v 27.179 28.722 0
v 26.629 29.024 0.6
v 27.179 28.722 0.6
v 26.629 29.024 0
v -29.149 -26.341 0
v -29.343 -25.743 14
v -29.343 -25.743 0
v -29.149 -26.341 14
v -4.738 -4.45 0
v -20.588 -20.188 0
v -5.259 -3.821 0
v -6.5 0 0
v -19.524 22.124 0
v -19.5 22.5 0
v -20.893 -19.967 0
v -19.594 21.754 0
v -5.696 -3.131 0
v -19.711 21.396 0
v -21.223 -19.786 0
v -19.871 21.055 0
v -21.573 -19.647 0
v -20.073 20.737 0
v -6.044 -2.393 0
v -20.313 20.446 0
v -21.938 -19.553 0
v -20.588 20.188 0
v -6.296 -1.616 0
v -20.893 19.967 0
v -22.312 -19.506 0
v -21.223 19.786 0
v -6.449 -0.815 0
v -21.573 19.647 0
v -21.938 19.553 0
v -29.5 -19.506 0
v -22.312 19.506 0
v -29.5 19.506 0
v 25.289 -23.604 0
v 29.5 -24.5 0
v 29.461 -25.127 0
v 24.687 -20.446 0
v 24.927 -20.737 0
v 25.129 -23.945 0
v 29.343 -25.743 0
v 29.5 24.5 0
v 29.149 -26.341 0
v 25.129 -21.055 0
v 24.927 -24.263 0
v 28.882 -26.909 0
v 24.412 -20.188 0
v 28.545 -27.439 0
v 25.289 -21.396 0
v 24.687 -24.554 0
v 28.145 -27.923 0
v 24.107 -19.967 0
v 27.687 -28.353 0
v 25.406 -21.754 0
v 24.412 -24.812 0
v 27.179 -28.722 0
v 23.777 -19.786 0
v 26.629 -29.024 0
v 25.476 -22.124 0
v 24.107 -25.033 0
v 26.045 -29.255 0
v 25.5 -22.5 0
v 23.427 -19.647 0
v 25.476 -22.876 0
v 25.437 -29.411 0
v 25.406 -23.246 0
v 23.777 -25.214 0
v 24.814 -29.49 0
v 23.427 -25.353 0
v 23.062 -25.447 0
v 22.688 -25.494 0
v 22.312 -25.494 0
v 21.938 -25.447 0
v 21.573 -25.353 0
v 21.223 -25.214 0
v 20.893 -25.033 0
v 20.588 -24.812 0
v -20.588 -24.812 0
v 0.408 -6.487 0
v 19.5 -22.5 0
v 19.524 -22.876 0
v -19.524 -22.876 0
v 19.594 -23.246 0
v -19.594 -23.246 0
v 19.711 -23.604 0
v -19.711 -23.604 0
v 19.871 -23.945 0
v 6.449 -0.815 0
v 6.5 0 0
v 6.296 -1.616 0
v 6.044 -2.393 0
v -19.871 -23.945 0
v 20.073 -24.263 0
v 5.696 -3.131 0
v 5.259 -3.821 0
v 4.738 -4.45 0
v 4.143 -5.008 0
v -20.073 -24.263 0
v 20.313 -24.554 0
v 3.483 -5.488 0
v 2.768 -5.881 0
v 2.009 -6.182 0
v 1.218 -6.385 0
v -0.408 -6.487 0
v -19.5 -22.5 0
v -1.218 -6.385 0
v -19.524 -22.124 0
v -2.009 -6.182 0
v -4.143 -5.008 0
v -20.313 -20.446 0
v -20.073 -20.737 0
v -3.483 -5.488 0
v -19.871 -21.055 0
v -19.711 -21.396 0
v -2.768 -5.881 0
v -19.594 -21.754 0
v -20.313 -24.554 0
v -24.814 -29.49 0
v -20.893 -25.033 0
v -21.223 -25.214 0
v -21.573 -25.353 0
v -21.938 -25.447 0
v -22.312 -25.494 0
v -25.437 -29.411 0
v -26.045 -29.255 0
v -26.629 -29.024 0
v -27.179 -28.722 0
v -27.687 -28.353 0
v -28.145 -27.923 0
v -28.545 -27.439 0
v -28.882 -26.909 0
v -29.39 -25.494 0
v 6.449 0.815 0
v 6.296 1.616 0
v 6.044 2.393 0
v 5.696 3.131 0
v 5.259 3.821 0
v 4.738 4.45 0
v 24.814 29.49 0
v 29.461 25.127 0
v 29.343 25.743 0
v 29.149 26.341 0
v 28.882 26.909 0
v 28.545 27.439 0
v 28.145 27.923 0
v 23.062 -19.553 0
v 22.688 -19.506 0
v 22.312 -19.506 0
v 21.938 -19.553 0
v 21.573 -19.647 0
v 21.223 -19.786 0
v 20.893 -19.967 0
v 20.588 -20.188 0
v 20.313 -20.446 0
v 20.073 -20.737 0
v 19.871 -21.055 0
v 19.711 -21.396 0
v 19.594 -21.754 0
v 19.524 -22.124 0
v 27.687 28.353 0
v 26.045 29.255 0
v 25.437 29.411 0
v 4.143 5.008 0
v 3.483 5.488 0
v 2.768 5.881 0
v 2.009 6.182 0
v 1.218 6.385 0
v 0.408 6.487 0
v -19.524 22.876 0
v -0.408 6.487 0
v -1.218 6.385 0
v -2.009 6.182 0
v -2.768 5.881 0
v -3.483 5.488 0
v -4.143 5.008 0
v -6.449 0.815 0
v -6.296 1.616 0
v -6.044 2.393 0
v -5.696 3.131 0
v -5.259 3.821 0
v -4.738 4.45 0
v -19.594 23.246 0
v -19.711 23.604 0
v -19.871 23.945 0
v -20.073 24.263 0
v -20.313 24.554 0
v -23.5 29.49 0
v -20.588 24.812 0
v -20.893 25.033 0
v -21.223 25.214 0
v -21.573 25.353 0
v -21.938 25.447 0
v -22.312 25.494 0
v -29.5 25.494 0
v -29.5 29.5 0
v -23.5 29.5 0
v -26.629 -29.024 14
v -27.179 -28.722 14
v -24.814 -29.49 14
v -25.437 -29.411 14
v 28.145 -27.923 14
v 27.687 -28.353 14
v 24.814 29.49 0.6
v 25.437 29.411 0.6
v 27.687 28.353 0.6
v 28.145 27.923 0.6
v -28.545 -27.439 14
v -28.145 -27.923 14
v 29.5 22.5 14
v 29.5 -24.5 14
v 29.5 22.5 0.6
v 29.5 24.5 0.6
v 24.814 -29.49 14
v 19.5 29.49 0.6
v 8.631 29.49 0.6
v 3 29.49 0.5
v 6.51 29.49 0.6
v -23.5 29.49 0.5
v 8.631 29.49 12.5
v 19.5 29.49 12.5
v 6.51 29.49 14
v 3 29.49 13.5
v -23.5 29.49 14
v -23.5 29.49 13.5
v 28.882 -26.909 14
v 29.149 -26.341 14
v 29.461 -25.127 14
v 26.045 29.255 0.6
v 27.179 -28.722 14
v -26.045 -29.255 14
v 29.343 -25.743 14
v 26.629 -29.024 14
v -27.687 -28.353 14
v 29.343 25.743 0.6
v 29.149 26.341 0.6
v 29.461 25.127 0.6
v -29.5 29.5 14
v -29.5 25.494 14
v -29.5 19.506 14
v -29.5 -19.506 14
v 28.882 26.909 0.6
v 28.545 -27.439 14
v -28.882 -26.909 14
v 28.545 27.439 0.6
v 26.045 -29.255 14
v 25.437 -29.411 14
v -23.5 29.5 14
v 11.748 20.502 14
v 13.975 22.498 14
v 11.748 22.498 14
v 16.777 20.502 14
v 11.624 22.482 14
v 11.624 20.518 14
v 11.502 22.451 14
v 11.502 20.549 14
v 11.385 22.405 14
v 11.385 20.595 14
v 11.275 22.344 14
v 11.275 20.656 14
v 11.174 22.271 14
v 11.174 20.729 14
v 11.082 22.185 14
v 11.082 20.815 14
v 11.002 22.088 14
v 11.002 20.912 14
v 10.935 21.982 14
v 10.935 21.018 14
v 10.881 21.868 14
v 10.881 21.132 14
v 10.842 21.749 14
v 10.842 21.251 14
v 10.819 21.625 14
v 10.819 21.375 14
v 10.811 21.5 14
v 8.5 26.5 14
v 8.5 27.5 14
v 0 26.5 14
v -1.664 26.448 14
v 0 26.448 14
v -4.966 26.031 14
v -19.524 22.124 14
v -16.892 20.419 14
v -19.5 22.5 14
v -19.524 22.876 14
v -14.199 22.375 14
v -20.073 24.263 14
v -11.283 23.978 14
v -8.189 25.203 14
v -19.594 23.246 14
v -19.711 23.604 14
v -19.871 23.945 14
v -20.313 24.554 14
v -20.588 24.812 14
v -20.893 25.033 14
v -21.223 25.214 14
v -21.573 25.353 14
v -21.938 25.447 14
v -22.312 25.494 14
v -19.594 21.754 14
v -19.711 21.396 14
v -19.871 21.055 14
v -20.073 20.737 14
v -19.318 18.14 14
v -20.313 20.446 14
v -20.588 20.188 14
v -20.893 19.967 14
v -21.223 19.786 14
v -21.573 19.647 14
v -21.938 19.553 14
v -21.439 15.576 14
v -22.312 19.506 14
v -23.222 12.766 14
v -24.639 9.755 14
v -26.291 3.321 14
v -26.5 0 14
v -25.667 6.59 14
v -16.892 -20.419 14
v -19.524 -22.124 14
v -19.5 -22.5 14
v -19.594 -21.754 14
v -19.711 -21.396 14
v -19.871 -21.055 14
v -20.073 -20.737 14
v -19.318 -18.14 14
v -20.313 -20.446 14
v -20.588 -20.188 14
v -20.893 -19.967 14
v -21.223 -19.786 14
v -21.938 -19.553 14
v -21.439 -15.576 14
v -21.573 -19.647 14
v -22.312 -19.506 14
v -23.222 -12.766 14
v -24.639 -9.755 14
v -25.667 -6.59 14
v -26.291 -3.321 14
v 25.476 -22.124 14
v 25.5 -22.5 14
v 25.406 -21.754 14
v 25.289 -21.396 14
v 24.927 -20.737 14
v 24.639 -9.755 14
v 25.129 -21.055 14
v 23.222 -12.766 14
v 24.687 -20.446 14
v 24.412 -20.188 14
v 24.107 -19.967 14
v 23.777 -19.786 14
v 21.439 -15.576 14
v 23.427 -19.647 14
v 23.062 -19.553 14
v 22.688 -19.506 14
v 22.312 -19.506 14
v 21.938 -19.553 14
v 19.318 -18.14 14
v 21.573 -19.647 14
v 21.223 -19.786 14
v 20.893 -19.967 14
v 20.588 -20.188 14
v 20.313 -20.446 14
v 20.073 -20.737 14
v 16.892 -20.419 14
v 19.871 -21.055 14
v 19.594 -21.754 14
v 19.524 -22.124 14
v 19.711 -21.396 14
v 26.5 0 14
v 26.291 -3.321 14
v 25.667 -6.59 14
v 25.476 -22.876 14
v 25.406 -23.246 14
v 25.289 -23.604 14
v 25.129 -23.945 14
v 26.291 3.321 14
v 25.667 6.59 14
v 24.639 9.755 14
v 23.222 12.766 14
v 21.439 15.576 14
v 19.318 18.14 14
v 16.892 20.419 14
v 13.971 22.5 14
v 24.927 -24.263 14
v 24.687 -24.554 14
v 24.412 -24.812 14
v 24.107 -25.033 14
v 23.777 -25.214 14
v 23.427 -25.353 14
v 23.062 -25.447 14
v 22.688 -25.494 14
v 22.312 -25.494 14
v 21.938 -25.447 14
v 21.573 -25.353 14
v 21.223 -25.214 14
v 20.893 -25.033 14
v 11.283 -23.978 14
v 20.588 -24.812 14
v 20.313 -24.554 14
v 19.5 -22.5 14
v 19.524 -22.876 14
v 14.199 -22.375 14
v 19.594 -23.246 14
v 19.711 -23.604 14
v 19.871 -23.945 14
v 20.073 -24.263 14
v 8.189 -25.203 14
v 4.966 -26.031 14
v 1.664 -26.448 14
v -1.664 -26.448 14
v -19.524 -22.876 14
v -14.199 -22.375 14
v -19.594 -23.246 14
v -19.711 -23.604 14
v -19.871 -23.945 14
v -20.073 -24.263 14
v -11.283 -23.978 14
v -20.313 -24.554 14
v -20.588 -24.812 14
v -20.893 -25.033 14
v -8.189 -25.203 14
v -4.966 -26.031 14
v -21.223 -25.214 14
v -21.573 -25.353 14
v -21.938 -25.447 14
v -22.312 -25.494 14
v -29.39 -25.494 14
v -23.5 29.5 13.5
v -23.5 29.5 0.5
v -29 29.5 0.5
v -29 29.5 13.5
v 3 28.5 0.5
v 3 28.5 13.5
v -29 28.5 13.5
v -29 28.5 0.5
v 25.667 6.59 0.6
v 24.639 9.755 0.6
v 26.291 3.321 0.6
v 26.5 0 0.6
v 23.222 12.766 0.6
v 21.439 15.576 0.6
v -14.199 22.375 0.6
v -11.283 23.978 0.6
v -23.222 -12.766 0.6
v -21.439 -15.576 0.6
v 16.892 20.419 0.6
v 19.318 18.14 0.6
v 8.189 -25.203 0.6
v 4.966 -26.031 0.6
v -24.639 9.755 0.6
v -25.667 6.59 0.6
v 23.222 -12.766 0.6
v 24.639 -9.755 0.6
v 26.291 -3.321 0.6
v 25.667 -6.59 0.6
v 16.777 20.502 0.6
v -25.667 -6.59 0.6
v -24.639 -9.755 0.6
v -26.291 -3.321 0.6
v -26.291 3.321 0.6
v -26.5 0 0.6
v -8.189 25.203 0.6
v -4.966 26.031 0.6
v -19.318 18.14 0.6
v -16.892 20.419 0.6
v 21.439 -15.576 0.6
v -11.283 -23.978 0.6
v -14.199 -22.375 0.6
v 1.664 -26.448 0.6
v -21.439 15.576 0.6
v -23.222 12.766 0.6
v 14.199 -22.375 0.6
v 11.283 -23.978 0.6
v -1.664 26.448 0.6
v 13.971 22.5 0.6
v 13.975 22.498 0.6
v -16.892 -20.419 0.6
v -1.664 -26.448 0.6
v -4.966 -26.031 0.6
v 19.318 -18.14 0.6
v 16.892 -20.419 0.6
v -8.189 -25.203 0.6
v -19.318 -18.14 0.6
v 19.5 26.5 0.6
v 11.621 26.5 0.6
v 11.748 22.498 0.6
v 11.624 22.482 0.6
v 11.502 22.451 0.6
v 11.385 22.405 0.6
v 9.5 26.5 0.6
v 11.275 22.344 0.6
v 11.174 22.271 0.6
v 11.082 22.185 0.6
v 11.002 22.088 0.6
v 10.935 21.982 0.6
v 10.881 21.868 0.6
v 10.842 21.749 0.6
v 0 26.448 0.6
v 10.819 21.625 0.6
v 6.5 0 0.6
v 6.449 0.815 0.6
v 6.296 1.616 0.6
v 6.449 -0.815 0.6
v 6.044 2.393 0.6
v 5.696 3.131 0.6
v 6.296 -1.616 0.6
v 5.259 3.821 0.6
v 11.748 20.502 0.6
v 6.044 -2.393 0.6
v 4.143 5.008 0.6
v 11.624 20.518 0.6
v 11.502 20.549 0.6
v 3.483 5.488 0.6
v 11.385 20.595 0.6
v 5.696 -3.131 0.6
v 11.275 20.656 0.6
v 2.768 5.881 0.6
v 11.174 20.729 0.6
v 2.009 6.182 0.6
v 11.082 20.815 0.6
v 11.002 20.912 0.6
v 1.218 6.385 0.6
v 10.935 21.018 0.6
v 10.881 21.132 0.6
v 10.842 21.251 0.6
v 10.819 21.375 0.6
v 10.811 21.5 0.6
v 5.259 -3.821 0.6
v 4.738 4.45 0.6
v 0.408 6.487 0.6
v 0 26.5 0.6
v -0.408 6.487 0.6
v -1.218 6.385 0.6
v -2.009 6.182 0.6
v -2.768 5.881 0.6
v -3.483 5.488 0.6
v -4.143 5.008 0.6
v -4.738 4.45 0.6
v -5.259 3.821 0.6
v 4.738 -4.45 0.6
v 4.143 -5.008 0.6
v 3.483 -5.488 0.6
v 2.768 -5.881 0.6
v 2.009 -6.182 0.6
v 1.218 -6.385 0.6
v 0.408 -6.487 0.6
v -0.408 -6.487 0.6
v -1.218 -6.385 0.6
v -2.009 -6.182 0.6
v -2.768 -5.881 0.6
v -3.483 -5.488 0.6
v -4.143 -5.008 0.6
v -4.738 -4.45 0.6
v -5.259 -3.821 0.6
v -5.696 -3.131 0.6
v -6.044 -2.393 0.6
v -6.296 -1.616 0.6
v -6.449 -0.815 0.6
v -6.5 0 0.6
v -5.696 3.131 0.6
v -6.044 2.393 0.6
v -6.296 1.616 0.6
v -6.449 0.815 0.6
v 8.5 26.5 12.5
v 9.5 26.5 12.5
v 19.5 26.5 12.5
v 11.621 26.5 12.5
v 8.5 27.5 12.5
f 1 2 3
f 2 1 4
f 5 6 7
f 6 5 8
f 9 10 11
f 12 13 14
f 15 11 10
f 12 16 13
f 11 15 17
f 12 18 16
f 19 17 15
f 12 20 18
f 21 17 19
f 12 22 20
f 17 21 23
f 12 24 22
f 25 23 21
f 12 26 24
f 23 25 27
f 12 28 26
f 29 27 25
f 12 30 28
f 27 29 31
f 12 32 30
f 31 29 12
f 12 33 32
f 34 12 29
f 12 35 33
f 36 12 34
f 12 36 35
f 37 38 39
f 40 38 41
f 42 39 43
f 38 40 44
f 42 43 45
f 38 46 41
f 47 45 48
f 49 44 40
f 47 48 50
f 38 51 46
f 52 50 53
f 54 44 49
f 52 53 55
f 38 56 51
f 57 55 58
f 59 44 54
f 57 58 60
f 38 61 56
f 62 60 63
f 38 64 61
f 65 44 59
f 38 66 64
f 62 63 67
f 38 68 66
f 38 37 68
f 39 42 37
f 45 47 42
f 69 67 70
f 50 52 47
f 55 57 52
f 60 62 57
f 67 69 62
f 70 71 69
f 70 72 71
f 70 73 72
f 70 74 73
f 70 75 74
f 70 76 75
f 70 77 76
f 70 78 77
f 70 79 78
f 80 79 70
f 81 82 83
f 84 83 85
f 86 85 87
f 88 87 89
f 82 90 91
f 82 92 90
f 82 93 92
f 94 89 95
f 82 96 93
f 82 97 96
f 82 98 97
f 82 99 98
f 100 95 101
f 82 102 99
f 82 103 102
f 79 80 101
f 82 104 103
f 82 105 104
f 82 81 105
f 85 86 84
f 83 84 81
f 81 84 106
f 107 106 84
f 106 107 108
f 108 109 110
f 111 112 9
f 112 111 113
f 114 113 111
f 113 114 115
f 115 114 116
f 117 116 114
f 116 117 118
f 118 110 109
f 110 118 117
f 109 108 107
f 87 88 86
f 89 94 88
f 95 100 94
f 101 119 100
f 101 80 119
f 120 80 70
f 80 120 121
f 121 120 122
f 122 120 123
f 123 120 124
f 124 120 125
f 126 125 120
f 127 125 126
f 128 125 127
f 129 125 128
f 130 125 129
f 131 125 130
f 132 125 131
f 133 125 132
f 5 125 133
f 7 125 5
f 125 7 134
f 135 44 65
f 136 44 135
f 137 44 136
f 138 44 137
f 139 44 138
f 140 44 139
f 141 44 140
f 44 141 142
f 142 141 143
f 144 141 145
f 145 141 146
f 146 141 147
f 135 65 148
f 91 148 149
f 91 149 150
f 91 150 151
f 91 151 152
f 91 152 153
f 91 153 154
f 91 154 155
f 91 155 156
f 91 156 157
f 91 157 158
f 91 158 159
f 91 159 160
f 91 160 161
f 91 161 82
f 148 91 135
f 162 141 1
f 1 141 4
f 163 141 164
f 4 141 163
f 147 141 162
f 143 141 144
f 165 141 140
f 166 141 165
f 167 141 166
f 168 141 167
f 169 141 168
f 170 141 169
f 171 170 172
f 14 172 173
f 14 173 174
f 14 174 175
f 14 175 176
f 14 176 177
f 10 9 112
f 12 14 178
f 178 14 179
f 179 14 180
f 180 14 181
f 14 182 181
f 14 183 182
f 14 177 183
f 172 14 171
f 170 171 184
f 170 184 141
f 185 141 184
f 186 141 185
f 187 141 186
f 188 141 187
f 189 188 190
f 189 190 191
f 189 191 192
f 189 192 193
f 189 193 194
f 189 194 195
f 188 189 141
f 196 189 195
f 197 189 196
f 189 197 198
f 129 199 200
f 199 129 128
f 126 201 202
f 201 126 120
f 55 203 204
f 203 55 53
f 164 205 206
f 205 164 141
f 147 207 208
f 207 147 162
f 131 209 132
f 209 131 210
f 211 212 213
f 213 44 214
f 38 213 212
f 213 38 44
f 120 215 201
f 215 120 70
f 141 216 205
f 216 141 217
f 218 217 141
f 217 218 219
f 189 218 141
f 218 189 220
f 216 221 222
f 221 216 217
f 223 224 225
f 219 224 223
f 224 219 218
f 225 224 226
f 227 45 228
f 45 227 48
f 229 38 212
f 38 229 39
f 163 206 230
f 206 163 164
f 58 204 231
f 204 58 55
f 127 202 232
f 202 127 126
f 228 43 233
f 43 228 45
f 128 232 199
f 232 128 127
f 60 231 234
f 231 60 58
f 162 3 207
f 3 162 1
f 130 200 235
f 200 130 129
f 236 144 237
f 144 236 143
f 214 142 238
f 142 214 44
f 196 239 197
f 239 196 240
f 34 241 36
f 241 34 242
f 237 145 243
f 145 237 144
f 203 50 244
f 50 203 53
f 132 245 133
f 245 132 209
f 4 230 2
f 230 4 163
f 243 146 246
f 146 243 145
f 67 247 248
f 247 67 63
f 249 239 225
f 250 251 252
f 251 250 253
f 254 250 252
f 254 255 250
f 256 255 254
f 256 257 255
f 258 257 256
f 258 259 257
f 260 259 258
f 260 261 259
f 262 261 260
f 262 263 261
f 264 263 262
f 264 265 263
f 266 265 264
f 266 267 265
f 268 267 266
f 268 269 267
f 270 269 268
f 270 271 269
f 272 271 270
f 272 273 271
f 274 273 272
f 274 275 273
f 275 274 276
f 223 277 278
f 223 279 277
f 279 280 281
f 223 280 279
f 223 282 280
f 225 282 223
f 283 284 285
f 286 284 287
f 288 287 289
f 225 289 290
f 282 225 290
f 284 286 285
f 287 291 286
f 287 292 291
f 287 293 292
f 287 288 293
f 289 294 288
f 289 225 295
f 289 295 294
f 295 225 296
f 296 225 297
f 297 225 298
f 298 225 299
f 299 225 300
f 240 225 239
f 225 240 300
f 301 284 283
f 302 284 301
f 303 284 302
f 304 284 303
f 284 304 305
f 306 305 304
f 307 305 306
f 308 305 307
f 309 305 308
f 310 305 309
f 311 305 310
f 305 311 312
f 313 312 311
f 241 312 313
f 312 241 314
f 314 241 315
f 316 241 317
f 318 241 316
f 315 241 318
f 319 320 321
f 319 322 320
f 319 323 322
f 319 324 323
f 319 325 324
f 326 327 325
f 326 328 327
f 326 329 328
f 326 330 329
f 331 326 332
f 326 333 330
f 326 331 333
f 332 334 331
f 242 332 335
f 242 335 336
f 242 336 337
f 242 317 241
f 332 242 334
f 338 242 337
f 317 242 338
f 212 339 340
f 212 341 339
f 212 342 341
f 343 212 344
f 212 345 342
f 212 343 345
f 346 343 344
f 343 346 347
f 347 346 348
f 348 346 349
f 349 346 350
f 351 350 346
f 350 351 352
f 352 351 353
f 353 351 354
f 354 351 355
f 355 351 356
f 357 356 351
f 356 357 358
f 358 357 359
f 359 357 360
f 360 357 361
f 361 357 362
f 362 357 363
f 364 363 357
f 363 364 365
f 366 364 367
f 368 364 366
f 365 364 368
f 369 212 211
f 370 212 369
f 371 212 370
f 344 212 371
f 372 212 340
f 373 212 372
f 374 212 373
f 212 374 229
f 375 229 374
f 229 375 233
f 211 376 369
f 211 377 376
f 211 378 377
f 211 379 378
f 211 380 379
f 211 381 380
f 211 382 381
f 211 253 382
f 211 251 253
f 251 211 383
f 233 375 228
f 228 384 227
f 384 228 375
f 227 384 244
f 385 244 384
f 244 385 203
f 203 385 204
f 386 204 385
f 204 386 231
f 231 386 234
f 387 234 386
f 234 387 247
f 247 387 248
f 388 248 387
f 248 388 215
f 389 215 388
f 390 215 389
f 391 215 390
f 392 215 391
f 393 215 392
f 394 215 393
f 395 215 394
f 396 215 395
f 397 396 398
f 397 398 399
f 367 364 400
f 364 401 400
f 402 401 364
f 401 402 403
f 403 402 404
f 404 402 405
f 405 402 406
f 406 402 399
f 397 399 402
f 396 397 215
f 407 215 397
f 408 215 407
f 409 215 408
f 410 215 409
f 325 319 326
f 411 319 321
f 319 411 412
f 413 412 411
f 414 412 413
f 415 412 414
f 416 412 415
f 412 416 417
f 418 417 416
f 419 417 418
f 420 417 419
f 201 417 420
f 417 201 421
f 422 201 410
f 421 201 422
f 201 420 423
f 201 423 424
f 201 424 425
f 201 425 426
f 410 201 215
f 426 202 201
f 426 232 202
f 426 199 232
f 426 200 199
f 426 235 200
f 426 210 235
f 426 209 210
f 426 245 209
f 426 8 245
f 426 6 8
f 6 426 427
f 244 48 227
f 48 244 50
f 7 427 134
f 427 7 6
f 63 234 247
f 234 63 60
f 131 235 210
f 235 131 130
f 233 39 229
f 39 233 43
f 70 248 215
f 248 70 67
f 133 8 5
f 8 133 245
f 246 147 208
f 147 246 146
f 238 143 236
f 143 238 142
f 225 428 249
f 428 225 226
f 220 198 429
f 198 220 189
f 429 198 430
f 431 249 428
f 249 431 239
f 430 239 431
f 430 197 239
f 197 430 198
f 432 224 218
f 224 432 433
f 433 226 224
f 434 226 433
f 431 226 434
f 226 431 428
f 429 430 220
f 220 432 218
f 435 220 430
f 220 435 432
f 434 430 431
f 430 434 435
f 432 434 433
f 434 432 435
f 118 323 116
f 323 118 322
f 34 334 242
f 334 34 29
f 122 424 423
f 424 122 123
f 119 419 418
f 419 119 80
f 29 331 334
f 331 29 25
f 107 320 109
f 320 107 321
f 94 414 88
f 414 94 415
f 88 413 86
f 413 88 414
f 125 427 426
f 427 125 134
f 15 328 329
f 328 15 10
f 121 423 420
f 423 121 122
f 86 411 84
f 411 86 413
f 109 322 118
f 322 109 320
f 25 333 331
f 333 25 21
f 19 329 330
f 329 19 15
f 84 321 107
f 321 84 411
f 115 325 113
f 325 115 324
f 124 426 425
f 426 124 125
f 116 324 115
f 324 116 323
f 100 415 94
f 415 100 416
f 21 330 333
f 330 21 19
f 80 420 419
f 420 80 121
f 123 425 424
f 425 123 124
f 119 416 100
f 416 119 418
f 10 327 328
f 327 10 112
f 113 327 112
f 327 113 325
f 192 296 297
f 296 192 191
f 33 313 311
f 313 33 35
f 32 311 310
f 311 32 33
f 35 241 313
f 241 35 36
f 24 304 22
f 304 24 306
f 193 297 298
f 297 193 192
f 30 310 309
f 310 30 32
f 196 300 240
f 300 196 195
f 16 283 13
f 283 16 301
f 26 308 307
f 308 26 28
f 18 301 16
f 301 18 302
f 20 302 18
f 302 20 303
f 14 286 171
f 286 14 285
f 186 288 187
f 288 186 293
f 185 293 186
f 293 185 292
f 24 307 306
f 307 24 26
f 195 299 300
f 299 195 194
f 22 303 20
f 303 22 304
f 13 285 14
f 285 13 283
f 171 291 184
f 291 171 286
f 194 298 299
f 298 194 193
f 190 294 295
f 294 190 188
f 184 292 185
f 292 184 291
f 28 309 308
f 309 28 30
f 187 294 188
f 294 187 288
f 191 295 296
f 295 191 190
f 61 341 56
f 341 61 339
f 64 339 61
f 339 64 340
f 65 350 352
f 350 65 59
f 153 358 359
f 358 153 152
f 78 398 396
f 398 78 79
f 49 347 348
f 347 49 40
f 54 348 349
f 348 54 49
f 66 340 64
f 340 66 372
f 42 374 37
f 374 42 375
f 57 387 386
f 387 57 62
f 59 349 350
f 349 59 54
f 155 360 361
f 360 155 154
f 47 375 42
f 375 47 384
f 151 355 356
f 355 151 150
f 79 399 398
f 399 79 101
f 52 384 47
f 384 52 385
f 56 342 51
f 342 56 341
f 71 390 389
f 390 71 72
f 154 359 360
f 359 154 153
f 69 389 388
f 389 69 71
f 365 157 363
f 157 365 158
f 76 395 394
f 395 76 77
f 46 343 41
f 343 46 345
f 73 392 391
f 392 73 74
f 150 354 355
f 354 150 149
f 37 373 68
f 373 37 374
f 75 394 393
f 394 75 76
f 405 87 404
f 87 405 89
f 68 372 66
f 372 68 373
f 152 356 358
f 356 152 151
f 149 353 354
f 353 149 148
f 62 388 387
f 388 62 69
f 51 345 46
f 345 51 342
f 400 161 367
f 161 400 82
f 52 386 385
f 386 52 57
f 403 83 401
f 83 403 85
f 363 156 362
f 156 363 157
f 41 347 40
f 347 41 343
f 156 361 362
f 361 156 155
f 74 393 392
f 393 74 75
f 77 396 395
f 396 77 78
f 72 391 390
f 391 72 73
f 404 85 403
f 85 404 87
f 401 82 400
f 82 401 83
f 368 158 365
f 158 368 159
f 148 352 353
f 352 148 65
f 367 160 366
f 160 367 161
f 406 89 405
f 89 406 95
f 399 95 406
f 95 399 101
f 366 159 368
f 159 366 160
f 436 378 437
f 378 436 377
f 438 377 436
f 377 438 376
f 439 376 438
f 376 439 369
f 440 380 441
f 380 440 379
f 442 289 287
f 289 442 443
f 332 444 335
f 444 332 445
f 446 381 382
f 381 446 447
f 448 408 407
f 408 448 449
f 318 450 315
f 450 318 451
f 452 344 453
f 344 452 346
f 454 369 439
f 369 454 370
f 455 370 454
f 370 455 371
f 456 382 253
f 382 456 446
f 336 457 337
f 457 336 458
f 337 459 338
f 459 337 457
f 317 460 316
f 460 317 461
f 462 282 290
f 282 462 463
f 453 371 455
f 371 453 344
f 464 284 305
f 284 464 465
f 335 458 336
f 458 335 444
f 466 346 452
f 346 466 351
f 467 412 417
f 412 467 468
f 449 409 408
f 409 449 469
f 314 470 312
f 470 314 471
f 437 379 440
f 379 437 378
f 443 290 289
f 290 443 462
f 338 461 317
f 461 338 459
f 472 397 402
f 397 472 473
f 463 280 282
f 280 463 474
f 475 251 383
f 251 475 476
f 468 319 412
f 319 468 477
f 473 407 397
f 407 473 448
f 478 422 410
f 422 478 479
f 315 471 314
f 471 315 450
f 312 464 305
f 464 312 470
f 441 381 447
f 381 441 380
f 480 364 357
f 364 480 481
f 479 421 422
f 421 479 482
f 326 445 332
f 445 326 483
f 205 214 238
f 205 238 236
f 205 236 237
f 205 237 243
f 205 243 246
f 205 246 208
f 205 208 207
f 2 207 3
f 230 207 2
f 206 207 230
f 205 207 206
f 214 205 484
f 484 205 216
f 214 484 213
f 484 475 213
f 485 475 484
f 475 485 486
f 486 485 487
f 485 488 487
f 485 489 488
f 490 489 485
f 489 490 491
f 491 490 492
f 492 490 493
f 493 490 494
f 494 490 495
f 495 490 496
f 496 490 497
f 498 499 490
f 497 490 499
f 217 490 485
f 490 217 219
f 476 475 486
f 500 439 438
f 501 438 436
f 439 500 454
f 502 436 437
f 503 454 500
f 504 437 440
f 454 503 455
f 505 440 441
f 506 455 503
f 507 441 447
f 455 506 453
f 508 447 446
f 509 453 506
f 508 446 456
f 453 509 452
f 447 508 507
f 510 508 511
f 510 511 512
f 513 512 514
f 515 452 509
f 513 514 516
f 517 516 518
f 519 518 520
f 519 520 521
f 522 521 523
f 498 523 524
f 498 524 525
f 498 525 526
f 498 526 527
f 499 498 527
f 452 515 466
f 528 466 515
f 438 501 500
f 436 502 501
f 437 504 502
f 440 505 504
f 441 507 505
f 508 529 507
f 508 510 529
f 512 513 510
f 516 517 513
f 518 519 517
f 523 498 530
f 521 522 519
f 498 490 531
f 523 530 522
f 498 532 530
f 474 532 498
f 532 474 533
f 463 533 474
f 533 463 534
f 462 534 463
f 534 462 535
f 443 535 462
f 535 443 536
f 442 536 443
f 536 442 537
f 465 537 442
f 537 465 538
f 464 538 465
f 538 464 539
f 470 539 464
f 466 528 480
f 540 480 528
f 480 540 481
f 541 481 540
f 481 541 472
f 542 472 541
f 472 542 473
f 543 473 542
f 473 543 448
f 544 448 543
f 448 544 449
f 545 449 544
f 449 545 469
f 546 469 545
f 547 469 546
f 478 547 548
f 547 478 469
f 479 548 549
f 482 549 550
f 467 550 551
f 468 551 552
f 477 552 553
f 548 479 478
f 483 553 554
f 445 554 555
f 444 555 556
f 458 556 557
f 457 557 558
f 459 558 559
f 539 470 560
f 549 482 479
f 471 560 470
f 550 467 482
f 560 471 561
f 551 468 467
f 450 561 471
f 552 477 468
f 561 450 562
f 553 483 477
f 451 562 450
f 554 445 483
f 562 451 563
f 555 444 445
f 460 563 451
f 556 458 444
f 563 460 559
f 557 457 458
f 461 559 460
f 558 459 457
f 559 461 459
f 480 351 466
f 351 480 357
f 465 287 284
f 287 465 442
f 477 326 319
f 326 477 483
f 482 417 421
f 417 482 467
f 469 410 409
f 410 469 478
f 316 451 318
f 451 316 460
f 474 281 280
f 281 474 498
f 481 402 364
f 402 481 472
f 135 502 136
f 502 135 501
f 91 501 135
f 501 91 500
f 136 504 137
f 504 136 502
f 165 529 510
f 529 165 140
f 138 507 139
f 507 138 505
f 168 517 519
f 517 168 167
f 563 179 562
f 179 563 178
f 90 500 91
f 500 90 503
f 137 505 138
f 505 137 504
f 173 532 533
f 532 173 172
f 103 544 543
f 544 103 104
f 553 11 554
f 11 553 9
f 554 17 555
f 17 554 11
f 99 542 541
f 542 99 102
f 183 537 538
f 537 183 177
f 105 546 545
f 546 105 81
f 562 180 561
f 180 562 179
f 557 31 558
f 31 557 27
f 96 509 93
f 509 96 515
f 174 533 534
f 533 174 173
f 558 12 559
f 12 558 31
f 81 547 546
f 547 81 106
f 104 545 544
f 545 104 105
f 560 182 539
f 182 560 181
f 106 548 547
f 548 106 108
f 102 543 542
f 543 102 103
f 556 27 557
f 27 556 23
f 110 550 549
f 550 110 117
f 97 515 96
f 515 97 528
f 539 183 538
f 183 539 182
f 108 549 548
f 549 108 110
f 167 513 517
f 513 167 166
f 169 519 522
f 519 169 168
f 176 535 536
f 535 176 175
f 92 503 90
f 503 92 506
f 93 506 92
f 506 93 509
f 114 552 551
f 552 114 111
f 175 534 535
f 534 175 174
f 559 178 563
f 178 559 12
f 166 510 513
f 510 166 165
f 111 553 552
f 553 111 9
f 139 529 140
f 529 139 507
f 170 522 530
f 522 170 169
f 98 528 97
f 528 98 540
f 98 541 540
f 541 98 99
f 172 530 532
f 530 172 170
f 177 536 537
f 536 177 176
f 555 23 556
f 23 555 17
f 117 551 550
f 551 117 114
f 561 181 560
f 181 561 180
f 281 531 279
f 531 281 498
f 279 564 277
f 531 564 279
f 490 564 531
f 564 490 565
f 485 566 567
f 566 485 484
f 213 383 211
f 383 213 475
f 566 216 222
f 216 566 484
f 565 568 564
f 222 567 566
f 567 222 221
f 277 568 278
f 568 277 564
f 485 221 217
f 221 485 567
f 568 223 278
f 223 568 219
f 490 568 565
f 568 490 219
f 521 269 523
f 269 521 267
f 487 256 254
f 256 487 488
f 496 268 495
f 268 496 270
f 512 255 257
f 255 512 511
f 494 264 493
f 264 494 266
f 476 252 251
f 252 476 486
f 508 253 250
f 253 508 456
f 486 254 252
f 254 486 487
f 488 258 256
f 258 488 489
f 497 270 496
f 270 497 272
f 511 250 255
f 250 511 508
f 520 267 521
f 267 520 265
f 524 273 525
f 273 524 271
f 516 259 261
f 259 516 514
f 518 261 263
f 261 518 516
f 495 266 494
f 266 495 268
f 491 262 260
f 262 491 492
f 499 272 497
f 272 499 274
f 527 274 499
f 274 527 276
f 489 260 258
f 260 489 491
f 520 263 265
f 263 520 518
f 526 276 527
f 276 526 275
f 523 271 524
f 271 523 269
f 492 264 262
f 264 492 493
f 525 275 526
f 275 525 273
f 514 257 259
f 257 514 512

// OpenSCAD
$fn = 50;


union() {
	difference() {
		union() {
			translate(v = [0, 0, 0]) {
				rotate(a = [0, 0, 0]) {
					hull() {
						translate(v = [-24.5000000000, 24.5000000000, 0]) {
							rotate(a = [0, 0, 0]) {
								translate(v = [0, 0, 0]) {
									rotate(a = [0, 0, 0]) {
										cylinder(h = 14, r = 5);
									}
								}
							}
						}
						translate(v = [24.5000000000, 24.5000000000, 0]) {
							rotate(a = [0, 0, 0]) {
								translate(v = [0, 0, 0]) {
									rotate(a = [0, 0, 0]) {
										cylinder(h = 14, r = 5);
									}
								}
							}
						}
						translate(v = [-24.5000000000, -24.5000000000, 0]) {
							rotate(a = [0, 0, 0]) {
								translate(v = [0, 0, 0]) {
									rotate(a = [0, 0, 0]) {
										cylinder(h = 14, r = 5);
									}
								}
							}
						}
						translate(v = [24.5000000000, -24.5000000000, 0]) {
							rotate(a = [0, 0, 0]) {
								translate(v = [0, 0, 0]) {
									rotate(a = [0, 0, 0]) {
										cylinder(h = 14, r = 5);
									}
								}
							}
						}
					}
				}
			}
			translate(v = [-29.5000000000, 23.5000000000, 0]) {
				rotate(a = [0, 0, 0]) {
					cube(size = [6, 6, 14]);
				}
			}
		}
		union() {
			#translate(v = [-29.0000000000, 28.5000000000, 0.5000000000]) {
				rotate(a = [0, 0, 0]) {
					cube(size = [32, 1, 13.0000000000]);
				}
			}
			translate(v = [-30.0000000000, -22.5000000000, -125]) {
				rotate(a = [0, 0, 0]) {
					hull() {
						translate(v = [7.5000000000, 0, 0]) {
							rotate(a = [0, 0, 0]) {
								translate(v = [0, 0, 0]) {
									rotate(a = [0, 0, 0]) {
										cylinder(h = 250, r = 3.0000000000);
									}
								}
							}
						}
						translate(v = [-7.5000000000, 0, 0]) {
							rotate(a = [0, 0, 0]) {
								translate(v = [0, 0, 0]) {
									rotate(a = [0, 0, 0]) {
										cylinder(h = 250, r = 3.0000000000);
									}
								}
							}
						}
					}
				}
			}
			translate(v = [-30.0000000000, 22.5000000000, -125]) {
				rotate(a = [0, 0, 0]) {
					hull() {
						translate(v = [7.5000000000, 0, 0]) {
							rotate(a = [0, 0, 0]) {
								translate(v = [0, 0, 0]) {
									rotate(a = [0, 0, 0]) {
										cylinder(h = 250, r = 3.0000000000);
									}
								}
							}
						}
						translate(v = [-7.5000000000, 0, 0]) {
							rotate(a = [0, 0, 0]) {
								translate(v = [0, 0, 0]) {
									rotate(a = [0, 0, 0]) {
										cylinder(h = 250, r = 3.0000000000);
									}
								}
							}
						}
					}
				}
			}
			translate(v = [22.5000000000, -22.5000000000, -125.0000000000]) {
				rotate(a = [0, 0, 0]) {
					cylinder(h = 250, r = 3.0000000000);
				}
			}
			translate(v = [0, 0, 0.6000000000]) {
				rotate(a = [0, 0, 0]) {
					cylinder(h = 16.4000000000, r = 26.5000000000);
				}
			}
			translate(v = [0, 0, -7.0000000000]) {
				rotate(a = [0, 0, 0]) {
					cylinder(h = 14, r = 6.5000000000);
				}
			}
			translate(v = [0.0000000000, 22.5000000000, 0.6000000000]) {
				rotate(a = [0, 0, 0]) {
					cube(size = [29.5000000000, 4, 16.4000000000]);
				}
			}
			translate(v = [19.5000000000, 22.5000000000, 0.6000000000]) {
				rotate(a = [0, 0, 0]) {
					cube(size = [10, 7, 16.4000000000]);
				}
			}
			translate(v = [8.5000000000, 22.5000000000, 12.5000000000]) {
				rotate(a = [0, 0, 0]) {
					cube(size = [21, 7, 1.5000000000]);
				}
			}
			translate(v = [5.7500000000, 30.2500000000, 0.6000000000]) {
				rotate(a = [0, 0, -45]) {
					cube(size = [7.5000000000, 1.5000000000, 16.4000000000]);
				}
			}
			translate(v = [5.0610000000, 20.5000000000, 0.6000000000]) {
				rotate(a = [0, 0, 0]) {
					cube(size = [7.5000000000, 2, 13.4000000000]);
				}
			}
		}
	}
	union() {
		translate(v = [14.3110000000, 21.5000000000, 0]) {
			rotate(a = [0, 0, 0]) {
				hull() {
					translate(v = [2.5000000000, 0, 0]) {
						rotate(a = [0, 0, 0]) {
							#translate(v = [0, 0, 0]) {
								rotate(a = [0, 0, 0]) {
									cylinder(h = 14, r = 1.0000000000);
								}
							}
						}
					}
					translate(v = [-2.5000000000, 0, 0]) {
						rotate(a = [0, 0, 0]) {
							#translate(v = [0, 0, 0]) {
								rotate(a = [0, 0, 0]) {
									cylinder(h = 14, r = 1.0000000000);
								}
							}
						}
					}
				}
			}
		}
	}
}
